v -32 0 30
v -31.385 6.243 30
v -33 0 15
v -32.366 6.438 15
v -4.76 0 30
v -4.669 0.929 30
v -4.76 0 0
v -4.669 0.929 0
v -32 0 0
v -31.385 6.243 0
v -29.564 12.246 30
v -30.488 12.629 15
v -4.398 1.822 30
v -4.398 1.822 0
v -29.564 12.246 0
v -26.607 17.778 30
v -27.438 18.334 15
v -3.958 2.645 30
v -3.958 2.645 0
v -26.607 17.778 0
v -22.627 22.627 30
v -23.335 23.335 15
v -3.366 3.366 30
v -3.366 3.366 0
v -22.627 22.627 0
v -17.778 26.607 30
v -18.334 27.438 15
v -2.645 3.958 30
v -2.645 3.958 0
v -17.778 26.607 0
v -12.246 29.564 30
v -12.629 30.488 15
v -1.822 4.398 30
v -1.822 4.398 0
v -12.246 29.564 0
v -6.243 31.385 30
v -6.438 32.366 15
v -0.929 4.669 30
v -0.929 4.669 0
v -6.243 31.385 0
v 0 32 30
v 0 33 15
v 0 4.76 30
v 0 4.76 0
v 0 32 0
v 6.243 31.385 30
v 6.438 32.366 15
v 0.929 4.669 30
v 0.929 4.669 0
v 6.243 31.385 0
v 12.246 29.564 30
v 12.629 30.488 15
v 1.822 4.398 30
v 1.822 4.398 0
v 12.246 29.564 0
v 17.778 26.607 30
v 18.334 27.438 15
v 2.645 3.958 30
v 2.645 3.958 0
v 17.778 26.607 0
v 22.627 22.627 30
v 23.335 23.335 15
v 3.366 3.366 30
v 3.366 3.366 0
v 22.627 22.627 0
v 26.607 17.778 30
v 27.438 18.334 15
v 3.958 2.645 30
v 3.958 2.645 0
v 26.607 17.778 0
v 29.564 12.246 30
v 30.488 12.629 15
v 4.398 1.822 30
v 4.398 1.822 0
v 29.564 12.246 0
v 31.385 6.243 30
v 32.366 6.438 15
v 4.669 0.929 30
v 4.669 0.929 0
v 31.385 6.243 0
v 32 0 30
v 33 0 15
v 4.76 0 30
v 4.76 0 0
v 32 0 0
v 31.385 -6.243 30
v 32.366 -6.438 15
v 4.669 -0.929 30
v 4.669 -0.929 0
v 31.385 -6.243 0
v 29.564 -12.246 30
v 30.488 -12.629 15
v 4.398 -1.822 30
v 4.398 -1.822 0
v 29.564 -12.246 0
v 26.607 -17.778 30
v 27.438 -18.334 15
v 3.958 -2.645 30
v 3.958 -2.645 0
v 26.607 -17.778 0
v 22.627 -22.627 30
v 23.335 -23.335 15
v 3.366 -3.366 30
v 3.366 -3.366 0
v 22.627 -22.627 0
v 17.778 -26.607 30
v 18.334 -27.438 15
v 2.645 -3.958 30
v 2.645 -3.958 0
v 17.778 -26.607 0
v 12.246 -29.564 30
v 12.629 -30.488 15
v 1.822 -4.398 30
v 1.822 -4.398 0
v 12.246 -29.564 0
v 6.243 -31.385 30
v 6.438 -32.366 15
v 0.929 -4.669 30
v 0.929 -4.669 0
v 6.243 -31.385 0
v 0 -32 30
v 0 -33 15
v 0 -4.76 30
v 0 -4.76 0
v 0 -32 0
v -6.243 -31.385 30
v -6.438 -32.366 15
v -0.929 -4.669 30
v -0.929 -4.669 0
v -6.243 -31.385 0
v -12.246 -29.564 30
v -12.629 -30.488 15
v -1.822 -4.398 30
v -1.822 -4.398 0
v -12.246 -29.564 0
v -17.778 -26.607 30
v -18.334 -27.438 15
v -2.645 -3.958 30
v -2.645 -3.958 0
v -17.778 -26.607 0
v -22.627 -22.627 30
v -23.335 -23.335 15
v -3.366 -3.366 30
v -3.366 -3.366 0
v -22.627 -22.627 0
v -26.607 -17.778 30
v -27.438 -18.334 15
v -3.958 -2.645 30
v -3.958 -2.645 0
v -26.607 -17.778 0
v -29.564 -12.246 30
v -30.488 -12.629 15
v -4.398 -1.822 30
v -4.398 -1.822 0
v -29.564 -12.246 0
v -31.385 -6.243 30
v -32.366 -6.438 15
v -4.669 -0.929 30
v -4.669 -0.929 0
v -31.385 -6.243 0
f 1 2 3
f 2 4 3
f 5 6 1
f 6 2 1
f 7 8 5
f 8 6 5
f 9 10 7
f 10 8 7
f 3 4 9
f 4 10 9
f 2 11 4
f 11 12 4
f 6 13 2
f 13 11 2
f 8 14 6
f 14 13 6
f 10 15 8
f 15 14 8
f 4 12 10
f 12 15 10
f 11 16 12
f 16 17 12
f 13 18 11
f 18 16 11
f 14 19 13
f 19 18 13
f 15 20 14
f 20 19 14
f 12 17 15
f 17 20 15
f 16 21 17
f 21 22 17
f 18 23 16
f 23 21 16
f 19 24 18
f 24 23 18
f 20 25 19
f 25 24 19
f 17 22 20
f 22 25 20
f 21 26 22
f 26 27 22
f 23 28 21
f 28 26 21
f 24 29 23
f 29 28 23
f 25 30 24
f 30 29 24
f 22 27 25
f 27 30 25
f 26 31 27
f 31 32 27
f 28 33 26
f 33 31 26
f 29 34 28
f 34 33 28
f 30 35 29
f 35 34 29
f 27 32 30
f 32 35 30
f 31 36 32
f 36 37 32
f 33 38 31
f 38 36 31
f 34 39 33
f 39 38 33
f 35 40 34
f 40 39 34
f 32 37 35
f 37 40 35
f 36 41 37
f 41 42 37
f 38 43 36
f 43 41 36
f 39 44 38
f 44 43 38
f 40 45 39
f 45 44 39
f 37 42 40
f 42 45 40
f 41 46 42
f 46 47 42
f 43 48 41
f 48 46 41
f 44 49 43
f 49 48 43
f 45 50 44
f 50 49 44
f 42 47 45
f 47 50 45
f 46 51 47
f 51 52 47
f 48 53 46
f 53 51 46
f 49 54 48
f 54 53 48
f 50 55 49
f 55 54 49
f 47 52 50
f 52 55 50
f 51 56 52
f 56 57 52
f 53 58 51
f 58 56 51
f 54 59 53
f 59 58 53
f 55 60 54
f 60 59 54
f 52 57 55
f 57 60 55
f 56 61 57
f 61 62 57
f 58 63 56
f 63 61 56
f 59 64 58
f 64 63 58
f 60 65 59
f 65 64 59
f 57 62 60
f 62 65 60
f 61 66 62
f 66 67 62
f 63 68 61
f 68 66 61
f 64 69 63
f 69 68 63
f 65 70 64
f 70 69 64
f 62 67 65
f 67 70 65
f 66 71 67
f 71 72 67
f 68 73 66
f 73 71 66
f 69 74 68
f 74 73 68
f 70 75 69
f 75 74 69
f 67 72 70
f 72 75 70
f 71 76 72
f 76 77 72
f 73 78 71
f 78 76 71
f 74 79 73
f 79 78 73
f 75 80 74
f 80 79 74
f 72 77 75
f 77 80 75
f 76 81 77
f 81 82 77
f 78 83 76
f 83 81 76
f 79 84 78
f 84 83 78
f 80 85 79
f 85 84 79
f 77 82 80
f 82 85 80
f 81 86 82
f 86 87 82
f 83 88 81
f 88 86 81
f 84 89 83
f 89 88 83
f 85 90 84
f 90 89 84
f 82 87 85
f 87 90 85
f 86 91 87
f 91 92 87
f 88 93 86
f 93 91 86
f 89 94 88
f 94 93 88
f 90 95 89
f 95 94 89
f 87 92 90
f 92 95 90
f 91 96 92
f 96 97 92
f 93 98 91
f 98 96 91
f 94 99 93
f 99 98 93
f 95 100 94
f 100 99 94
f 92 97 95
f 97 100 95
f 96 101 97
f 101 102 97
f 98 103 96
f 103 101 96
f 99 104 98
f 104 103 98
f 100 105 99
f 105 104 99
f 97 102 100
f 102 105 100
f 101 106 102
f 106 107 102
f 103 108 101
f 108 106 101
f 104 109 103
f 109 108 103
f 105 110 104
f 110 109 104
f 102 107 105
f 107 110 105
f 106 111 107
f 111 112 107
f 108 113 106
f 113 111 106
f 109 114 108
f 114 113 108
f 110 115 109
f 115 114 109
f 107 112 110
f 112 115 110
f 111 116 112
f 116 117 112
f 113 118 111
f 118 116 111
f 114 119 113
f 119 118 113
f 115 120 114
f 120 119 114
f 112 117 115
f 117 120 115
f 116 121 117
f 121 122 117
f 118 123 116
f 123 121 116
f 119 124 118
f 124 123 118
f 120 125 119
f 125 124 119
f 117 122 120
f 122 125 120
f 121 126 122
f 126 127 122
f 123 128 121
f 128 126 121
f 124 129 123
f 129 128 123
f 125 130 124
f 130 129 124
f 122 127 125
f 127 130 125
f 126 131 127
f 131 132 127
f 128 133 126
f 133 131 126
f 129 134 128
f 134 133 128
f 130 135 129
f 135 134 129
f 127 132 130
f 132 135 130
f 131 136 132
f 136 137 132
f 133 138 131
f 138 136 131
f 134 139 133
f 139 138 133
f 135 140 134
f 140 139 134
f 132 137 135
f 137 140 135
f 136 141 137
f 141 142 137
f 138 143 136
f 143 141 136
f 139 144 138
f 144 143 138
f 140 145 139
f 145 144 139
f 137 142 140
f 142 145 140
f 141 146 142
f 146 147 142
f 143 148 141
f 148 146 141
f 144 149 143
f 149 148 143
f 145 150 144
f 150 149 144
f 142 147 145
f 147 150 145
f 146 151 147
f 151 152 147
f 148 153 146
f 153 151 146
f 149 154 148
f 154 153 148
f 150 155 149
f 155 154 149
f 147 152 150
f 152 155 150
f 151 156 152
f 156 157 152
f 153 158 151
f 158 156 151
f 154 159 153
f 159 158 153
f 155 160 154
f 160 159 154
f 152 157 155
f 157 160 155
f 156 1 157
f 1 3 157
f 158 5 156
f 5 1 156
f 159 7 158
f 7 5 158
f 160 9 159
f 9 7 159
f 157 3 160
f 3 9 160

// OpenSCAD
$fn = 32;

// ----------------------------------------------------------------------
// Belt roller: 64 mm barrel, 30 mm wide, bore 9.52 mm
// ----------------------------------------------------------------------

// --- parameters (mm) ---
bore_d = 9.52;            // bore
barrel_d = 64;            // barrel diameter
roller_w = 30;            // roller width
crown = 1;                // crown height at mid width

roller_profile = [[4.76, 0], [32, 0], [33, 15], [32, 30], [4.76, 30]];

/* the profile stays clear of the axis, so the bore comes out of the revolve */
rotate_extrude() polygon(roller_profile);
